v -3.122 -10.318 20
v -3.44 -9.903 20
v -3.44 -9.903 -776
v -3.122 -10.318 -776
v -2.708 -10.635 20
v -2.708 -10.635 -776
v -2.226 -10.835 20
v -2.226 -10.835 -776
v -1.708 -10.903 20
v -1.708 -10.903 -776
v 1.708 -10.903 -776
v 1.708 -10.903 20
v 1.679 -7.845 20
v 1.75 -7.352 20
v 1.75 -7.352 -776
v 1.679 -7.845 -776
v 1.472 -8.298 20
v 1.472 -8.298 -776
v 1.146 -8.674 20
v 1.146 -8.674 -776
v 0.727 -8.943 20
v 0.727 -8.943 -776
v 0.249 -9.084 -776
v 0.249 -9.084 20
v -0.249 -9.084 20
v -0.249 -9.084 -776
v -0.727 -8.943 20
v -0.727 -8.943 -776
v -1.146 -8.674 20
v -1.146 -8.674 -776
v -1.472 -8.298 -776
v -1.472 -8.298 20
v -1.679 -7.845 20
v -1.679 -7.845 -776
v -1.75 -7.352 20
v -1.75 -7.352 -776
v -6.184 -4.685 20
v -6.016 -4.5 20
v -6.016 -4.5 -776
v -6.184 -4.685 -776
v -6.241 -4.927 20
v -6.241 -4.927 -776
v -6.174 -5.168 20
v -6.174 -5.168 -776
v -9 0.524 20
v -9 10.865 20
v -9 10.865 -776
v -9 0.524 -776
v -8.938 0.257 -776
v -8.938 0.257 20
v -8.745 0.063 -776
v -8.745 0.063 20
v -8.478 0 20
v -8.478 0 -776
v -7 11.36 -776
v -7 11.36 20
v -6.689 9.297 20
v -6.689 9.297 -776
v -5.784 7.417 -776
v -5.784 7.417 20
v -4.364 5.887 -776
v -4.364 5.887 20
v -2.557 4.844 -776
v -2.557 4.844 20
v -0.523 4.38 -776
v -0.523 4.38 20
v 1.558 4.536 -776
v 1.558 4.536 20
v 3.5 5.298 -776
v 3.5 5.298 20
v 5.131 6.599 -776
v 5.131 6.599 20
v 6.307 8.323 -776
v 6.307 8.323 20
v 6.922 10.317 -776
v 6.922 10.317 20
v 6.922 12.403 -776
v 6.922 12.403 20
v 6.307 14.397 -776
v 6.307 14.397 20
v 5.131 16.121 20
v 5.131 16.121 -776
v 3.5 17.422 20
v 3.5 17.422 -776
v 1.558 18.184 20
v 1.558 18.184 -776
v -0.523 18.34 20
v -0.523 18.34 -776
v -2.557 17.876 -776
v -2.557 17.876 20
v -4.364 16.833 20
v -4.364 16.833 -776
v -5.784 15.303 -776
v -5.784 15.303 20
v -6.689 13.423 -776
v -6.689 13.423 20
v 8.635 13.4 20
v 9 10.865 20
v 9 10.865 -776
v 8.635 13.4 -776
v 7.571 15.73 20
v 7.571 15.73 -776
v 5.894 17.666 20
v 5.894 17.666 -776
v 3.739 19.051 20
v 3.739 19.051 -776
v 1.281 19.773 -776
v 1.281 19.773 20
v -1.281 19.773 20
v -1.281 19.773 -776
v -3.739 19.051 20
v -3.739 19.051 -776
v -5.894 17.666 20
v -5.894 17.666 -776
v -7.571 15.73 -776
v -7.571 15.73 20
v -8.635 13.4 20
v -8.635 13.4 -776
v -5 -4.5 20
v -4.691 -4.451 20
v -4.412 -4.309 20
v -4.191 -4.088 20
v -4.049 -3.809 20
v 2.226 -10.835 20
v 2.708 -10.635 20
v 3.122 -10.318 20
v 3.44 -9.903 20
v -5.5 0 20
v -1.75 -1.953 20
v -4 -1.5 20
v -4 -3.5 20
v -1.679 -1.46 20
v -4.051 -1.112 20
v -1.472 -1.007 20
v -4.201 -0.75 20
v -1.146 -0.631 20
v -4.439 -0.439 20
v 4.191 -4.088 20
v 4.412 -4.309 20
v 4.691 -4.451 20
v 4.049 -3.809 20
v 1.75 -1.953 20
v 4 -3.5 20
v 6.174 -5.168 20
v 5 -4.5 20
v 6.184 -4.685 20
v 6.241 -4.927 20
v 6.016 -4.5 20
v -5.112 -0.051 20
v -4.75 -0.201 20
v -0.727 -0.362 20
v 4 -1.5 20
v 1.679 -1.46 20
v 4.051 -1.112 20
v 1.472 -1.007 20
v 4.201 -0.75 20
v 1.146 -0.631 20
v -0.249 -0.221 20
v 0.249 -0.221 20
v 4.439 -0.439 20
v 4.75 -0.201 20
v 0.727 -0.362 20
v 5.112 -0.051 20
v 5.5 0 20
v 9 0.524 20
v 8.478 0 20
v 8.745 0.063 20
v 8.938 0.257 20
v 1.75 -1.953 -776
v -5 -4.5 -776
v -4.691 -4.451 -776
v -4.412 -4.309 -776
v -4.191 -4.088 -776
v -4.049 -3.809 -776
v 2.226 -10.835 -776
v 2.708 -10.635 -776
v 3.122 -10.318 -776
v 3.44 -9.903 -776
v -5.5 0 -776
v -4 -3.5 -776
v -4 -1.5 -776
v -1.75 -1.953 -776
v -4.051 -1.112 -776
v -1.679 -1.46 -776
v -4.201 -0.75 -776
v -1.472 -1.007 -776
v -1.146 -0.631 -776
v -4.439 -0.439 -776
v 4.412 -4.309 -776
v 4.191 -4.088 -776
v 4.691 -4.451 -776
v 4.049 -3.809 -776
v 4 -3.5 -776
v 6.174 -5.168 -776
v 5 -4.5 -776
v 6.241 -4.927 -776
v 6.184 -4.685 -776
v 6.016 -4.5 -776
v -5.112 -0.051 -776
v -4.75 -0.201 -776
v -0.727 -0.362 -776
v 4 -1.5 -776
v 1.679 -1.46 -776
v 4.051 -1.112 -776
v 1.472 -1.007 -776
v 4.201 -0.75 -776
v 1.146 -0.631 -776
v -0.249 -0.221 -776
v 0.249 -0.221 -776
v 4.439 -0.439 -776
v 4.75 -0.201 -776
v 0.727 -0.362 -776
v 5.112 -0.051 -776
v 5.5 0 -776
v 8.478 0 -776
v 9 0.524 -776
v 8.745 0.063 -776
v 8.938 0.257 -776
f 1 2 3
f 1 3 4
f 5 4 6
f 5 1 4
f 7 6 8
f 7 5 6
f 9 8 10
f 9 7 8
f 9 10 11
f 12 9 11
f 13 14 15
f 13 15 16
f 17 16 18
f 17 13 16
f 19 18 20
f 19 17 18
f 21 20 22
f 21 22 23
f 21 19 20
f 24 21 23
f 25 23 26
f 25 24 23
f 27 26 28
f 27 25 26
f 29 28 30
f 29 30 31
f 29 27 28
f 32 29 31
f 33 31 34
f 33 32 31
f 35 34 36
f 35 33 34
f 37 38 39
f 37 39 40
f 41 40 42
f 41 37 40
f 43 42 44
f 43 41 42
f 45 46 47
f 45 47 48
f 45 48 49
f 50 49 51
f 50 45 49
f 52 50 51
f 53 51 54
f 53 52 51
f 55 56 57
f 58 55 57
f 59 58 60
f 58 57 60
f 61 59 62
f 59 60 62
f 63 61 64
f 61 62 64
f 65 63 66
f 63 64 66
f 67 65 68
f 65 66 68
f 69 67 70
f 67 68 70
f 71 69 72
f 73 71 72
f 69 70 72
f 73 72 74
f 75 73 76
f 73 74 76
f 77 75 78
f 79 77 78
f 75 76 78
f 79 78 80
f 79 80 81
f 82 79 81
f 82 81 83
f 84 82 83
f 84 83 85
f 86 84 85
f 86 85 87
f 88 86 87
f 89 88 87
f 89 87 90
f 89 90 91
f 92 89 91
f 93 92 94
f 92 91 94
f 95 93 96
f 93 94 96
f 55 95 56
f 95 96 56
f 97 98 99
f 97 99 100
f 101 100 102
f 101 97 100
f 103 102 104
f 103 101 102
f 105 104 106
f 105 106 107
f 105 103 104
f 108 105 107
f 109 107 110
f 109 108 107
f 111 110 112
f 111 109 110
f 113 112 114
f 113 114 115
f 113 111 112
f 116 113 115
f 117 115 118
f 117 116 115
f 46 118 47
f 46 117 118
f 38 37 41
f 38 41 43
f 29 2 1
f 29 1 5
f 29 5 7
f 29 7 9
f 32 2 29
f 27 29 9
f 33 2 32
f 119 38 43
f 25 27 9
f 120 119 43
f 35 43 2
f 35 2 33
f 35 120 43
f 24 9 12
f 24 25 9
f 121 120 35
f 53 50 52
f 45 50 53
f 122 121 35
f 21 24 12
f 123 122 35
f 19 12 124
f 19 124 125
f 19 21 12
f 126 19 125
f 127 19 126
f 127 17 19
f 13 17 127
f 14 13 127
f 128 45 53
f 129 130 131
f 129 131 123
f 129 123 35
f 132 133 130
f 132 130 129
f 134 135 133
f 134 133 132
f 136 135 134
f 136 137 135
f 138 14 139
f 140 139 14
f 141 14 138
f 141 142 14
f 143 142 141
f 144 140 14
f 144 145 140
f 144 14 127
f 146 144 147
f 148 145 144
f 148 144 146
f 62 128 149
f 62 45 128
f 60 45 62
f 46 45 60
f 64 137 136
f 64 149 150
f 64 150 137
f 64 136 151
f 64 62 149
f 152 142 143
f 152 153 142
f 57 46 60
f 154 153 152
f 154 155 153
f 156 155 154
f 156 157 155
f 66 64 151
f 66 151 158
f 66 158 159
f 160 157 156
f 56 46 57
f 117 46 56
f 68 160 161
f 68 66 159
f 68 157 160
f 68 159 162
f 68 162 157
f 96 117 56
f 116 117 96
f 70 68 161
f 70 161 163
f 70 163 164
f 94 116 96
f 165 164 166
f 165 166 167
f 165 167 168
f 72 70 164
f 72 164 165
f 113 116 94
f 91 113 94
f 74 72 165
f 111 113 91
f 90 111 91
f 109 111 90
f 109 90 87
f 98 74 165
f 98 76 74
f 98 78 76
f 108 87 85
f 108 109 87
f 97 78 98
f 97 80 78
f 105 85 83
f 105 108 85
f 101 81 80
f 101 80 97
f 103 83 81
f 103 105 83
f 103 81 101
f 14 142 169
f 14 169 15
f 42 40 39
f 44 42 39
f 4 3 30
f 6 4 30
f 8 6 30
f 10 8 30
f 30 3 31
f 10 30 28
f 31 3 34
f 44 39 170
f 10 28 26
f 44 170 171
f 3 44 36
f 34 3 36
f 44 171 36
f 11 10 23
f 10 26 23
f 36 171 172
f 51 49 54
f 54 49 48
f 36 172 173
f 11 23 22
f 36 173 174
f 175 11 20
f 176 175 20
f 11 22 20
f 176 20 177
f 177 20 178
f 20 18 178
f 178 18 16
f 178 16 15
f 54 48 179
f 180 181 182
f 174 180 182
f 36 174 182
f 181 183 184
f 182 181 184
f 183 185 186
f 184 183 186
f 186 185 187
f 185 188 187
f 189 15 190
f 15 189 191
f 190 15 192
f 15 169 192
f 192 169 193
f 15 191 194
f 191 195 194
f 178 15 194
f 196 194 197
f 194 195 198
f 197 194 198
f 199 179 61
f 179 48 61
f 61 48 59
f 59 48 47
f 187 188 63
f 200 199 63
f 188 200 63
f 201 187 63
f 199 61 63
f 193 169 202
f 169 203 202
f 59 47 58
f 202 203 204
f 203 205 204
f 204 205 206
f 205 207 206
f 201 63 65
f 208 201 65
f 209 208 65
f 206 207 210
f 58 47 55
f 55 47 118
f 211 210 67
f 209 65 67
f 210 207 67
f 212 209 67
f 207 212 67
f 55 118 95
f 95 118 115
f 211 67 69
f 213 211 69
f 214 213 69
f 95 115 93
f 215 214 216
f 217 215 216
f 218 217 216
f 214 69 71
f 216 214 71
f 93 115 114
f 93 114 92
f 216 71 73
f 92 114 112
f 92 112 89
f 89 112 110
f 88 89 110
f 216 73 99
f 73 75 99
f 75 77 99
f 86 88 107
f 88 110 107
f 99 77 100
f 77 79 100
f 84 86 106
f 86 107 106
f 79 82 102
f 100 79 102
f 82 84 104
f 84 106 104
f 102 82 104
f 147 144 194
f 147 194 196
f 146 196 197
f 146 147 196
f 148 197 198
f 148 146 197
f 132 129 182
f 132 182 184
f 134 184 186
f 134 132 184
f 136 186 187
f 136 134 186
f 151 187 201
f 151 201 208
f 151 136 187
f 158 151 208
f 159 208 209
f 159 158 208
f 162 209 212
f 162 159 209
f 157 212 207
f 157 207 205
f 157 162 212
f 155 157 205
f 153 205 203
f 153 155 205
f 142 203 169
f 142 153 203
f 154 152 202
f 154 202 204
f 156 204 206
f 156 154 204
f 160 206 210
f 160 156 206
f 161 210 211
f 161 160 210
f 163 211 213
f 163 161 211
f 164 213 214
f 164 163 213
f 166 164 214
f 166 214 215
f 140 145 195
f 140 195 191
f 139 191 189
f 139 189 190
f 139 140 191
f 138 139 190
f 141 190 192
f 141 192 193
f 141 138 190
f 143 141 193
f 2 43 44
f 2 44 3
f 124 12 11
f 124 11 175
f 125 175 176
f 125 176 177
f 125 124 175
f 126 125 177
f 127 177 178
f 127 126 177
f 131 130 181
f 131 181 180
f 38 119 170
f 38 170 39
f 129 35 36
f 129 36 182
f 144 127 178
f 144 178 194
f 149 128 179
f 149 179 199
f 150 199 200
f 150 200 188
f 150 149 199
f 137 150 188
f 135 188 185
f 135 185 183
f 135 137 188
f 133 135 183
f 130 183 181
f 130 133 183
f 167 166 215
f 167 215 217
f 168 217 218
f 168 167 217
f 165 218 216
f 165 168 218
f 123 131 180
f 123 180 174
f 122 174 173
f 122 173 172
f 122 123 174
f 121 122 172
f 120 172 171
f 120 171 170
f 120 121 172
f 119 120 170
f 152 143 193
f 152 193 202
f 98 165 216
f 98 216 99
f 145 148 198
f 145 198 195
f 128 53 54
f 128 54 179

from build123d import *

# Parameters (mm, degrees)
ESQUISSE1_R        = 7
BOSS_EXTRU_1_DEPTH = 796


with BuildPart() as part:
    # Esquisse1 → Boss.-Extru.1 (new body)
    with BuildSketch(Plane.XY.offset(20)):
        with BuildLine():
            Line((-9, 10.864586864), (-9, 0.523924837))
            ThreePointArc((-9, 0.523924837), (-8.854824532, 0.14661401), (-8.478070356, 0))
            Line((-8.478070356, 0), (-5.5, 0))
            ThreePointArc((-5.5, 0), (-4.439339828, -0.439339828), (-4, -1.5))
            Line((-4, -1.5), (-4, -3.5))
            ThreePointArc((-4, -3.5), (-4.292893219, -4.207106781), (-5, -4.5))
            Line((-5, -4.5), (-6.016007613, -4.5))
            ThreePointArc((-6.016007613, -4.5), (-6.227713349, -4.802430523), (-6.174193657, -5.16769643))
            Line((-6.174193657, -5.16769643), (-3.440043573, -9.90338329))
            ThreePointArc((-3.440043573, -9.90338329), (-2.707992766, -10.635434098), (-1.707992766, -10.90338329))
            Line((-1.707992766, -10.90338329), (1.707992766, -10.90338329))
            ThreePointArc((1.707992766, -10.90338329), (2.707992766, -10.635434098), (3.440043573, -9.90338329))
            Line((3.440043573, -9.90338329), (6.174193657, -5.16769643))
            ThreePointArc((6.174193657, -5.16769643), (6.227713349, -4.802430523), (6.016007614, -4.5))
            Line((6.016007614, -4.5), (5, -4.5))
            ThreePointArc((5, -4.5), (4.292893219, -4.207106781), (4, -3.5))
            Line((4, -3.5), (4, -1.5))
            ThreePointArc((4, -1.5), (4.439339828, -0.439339828), (5.5, 0))
            Line((5.5, 0), (8.478070356, 0))
            ThreePointArc((8.478070356, 0), (8.854824532, 0.14661401), (9, 0.523924837))
            Line((9, 0.523924837), (9, 10.864586864))
            ThreePointArc((9, 10.864586864), (0, 19.864586864), (-9, 10.864586864))
        make_face()
        with Locations(Location((0, 11.36, 0), (0, 0, 180))):
            Circle(ESQUISSE1_R, mode=Mode.SUBTRACT)
        with BuildLine():
            Line((1.75, -1.95338329), (1.75, -7.351528839))
            ThreePointArc((1.75, -7.351528839), (0, -9.101528839), (-1.75, -7.351528839))
            Line((-1.75, -7.351528839), (-1.75, -1.95338329))
            ThreePointArc((-1.75, -1.95338329), (0, -0.20338329), (1.75, -1.95338329))
        make_face(mode=Mode.SUBTRACT)
    extrude(amount=-BOSS_EXTRU_1_DEPTH)


solid = part.part
